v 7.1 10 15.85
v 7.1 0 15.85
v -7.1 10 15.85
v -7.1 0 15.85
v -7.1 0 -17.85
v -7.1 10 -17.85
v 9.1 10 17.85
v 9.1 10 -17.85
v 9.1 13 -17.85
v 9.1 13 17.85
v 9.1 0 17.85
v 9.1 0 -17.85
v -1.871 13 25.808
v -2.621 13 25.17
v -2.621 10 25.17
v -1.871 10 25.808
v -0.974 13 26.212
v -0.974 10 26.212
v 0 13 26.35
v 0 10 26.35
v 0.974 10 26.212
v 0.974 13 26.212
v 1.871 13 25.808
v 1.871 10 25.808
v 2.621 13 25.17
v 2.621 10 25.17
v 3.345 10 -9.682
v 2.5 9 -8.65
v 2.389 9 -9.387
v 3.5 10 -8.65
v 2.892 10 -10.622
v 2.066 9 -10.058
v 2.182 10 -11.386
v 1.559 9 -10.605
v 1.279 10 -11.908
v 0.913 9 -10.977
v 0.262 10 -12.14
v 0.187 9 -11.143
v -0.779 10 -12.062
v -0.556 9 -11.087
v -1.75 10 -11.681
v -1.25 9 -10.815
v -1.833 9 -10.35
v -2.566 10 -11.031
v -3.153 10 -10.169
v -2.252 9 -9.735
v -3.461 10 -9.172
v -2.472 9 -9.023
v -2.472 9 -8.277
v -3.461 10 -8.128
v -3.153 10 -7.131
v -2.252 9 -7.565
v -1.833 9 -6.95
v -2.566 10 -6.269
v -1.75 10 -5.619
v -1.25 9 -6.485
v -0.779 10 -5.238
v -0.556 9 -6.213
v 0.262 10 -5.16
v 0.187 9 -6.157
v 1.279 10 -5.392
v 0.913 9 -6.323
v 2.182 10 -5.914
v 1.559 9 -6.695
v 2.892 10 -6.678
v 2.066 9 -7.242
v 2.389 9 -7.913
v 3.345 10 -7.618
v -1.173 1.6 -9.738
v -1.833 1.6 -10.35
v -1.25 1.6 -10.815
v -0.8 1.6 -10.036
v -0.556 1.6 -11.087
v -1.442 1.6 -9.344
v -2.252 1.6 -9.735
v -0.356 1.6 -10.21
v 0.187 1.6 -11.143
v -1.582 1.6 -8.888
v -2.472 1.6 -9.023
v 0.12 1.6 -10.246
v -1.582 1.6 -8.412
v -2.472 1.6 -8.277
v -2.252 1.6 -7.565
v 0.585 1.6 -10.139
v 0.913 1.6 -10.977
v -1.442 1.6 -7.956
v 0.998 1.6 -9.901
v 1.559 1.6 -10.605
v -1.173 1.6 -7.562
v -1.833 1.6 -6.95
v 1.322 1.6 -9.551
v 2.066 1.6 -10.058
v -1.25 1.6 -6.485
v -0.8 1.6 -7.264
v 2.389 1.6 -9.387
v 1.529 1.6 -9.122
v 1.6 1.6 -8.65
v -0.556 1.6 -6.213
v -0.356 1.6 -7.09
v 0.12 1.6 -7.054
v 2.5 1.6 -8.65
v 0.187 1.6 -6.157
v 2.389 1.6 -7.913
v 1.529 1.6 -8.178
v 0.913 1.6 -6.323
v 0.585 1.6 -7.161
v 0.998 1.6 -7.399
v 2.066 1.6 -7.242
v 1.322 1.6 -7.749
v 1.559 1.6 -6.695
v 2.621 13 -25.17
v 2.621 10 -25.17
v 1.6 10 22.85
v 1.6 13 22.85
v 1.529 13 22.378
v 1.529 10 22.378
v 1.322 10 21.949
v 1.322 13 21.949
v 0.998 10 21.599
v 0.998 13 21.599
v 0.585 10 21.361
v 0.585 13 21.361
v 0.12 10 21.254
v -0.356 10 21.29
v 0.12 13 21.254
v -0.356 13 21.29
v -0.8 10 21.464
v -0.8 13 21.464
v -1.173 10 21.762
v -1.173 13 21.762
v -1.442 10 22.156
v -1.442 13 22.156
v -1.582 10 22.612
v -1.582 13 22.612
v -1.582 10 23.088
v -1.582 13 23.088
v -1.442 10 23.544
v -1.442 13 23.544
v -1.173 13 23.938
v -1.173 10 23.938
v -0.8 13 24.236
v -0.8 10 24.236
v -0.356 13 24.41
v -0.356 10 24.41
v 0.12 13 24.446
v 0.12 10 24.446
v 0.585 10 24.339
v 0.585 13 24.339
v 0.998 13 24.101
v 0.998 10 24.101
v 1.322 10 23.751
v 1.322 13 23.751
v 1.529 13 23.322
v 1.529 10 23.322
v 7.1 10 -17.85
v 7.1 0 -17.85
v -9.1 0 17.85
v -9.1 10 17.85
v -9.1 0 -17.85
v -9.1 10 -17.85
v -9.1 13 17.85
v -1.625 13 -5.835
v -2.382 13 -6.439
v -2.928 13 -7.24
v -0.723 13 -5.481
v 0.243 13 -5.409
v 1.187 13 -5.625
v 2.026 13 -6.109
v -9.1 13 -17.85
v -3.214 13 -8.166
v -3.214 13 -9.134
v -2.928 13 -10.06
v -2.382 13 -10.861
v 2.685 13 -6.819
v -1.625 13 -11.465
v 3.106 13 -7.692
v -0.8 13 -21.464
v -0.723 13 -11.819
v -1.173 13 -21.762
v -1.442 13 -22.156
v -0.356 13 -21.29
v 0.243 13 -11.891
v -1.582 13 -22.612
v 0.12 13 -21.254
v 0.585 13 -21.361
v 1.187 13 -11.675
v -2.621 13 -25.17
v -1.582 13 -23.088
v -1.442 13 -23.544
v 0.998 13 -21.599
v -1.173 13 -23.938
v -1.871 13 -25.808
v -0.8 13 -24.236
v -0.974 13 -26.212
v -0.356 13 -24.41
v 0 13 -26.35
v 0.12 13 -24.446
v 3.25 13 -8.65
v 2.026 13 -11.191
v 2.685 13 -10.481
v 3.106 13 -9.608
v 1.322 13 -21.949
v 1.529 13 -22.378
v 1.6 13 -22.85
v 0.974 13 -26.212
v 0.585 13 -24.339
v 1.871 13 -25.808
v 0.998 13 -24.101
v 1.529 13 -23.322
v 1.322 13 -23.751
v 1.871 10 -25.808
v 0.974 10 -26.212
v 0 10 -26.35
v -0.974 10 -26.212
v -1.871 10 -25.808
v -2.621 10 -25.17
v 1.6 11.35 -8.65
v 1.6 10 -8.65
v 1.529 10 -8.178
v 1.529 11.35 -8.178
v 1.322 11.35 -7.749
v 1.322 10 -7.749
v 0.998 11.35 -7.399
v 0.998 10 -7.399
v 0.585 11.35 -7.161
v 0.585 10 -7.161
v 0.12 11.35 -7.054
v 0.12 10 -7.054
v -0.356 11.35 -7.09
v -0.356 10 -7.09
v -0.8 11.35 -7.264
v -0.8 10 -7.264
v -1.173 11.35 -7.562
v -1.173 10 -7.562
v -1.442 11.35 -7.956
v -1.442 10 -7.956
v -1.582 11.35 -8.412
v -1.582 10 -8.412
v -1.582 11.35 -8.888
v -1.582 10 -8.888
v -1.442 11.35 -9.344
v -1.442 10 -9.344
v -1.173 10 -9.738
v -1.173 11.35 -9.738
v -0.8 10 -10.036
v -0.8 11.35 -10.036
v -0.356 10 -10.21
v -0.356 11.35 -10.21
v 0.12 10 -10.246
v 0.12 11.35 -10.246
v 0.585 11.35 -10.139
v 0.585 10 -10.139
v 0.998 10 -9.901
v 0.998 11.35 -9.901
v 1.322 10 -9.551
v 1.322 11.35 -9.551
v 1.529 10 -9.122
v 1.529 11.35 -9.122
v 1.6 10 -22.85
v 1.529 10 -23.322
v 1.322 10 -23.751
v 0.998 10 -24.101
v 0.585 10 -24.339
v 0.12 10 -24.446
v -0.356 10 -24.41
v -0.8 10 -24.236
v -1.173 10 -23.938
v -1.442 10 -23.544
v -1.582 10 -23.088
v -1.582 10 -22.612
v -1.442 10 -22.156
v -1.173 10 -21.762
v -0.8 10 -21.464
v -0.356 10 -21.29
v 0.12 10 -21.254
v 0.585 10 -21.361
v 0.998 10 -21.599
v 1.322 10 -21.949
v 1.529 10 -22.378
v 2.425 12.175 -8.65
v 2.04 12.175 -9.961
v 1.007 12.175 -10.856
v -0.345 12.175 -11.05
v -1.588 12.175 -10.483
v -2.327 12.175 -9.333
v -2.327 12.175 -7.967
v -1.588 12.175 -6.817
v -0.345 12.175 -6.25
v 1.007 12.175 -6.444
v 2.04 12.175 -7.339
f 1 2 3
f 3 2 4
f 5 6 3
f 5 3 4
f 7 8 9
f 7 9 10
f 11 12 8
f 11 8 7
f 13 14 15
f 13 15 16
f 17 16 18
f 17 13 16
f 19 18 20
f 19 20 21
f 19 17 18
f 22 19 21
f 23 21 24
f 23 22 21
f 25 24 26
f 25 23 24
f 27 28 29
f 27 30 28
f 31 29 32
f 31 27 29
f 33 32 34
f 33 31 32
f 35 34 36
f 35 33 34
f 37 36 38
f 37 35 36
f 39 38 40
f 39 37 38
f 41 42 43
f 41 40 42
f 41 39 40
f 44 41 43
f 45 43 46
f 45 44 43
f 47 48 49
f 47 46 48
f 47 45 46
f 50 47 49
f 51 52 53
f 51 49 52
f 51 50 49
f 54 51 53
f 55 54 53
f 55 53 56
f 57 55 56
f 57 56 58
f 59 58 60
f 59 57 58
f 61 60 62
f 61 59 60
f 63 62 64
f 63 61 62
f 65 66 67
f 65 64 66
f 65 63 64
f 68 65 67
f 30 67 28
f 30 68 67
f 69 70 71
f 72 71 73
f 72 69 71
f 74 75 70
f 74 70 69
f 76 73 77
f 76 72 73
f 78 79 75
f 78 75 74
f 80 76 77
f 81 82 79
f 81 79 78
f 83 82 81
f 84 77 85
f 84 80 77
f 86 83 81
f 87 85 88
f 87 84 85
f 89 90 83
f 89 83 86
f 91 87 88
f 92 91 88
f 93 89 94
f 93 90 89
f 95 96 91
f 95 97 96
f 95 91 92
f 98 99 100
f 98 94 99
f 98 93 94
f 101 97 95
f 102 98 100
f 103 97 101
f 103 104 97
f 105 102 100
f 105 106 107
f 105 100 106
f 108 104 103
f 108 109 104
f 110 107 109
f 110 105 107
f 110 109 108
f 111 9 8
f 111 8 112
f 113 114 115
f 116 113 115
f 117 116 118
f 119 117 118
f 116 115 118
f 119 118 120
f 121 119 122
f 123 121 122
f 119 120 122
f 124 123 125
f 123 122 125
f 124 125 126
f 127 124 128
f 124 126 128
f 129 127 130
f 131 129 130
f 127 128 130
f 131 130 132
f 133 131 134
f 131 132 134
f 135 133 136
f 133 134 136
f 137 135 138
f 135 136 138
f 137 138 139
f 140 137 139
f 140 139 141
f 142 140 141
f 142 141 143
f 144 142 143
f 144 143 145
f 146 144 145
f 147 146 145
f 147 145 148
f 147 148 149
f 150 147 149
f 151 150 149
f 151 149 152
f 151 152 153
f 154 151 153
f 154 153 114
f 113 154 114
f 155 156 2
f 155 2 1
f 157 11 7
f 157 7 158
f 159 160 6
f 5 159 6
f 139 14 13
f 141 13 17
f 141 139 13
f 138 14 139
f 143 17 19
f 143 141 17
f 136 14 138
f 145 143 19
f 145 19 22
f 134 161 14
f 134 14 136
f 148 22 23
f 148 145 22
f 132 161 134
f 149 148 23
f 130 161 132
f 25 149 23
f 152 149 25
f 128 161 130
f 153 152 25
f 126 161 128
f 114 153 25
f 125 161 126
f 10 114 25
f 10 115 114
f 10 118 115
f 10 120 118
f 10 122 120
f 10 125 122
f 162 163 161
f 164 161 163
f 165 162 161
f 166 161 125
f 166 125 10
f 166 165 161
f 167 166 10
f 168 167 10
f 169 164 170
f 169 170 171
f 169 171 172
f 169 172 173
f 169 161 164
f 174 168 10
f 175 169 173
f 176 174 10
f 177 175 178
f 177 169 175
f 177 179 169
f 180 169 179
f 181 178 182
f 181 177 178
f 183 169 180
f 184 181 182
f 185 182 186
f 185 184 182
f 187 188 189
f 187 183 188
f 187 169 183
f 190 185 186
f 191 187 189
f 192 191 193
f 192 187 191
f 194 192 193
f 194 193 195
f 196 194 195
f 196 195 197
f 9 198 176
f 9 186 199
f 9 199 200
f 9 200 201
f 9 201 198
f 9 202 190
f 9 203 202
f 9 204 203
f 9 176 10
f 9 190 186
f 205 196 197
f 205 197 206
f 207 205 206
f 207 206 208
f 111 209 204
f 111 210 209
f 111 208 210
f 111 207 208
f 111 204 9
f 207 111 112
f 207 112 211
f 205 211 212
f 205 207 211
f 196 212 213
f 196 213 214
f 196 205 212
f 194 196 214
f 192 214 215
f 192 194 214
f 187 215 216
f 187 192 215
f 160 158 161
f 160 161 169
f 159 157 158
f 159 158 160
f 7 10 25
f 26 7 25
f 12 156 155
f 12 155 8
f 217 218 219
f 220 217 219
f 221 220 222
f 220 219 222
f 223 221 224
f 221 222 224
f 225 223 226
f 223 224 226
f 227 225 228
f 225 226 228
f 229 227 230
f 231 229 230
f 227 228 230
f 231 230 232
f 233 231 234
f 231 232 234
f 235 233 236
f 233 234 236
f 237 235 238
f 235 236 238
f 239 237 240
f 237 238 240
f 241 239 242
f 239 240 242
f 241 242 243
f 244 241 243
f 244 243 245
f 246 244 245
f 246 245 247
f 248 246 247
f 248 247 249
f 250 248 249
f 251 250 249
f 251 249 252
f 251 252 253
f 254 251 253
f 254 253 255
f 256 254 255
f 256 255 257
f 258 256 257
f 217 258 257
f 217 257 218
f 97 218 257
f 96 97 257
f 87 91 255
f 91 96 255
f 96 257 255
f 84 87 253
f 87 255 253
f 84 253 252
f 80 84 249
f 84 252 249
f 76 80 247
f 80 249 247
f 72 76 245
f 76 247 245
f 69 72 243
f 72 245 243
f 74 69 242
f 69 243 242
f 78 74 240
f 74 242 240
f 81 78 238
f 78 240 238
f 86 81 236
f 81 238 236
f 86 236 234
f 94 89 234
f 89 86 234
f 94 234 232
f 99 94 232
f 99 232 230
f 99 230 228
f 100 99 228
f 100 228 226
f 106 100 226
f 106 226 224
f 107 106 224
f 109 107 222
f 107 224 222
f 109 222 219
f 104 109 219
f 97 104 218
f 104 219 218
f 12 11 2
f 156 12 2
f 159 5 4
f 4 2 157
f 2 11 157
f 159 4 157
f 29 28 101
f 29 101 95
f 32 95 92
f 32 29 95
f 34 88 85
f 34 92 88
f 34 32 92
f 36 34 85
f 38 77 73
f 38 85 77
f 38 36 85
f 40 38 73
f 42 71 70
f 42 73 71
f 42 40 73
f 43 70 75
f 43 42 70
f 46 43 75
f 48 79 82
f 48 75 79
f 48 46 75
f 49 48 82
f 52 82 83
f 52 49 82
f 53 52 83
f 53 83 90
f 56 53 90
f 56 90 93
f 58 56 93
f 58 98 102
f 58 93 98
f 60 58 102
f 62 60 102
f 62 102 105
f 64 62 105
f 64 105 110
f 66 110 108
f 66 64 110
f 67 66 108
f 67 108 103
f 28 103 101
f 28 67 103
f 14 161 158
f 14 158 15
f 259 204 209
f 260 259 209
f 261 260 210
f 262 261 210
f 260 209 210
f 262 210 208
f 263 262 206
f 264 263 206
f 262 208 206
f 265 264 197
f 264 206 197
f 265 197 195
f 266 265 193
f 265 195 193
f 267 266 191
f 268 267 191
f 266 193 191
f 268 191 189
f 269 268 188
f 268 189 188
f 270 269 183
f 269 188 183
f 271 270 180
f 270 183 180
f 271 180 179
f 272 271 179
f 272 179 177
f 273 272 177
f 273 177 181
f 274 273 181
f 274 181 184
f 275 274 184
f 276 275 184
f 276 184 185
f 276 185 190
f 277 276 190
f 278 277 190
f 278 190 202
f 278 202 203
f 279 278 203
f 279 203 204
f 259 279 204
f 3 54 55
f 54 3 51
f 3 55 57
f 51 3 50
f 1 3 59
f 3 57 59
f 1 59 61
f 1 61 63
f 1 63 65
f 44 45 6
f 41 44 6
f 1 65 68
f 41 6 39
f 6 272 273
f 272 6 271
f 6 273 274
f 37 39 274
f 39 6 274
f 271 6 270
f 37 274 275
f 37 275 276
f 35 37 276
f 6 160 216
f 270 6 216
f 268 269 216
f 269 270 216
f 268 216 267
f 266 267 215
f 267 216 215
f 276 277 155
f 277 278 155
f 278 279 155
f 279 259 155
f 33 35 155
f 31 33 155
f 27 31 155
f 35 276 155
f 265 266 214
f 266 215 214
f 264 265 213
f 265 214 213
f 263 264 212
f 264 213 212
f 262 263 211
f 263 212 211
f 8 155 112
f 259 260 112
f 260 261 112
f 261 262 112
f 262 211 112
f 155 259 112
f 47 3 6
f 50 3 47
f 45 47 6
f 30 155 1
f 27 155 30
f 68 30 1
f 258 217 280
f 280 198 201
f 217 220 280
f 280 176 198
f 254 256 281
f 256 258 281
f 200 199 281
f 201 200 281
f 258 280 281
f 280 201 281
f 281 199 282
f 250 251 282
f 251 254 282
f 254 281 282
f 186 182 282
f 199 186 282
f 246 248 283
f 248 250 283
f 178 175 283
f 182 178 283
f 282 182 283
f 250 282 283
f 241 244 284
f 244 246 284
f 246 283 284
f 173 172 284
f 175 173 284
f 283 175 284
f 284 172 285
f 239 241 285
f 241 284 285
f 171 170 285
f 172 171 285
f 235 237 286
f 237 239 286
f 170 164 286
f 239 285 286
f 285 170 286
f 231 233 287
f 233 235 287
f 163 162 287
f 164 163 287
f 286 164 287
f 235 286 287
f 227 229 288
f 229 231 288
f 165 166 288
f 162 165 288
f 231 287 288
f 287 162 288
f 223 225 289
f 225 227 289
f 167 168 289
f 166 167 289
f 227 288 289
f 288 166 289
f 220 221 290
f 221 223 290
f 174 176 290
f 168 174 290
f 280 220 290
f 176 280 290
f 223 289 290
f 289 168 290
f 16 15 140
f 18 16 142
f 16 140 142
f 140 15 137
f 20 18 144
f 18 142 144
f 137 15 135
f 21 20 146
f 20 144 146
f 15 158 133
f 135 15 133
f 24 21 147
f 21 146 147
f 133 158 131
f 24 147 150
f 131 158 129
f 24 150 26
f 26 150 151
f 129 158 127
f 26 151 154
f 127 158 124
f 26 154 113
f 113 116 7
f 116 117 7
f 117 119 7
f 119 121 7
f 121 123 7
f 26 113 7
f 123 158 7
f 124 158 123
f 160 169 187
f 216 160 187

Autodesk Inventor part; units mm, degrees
ref_plane "YZ Plane" through (0, 0, 0) normal (1, 0, 0) x (0, 1, 0)
ref_plane "XZ Plane" through (0, 0, 0) normal (0, 1, 0) x (-1, 0, 0)
ref_plane "XY Plane" through (0, 0, 0) normal (0, 0, 1) x (1, 0, 0)
sketch "Эскиз1" plane through (0, 0, 0) normal (0, 1, 0) x (-1, 0, 0)
  line L0 (7.1, -15.85) -> (-7.1, -15.85)
  line L1 (-7.1, -15.85) -> (-7.1, 15.85)
  line L2 (-7.1, 15.85) -> (7.1, 15.85)
  line L3 (7.1, 15.85) -> (7.1, -15.85)
  line L4 (7.1, -15.85) -> (-7.1, 15.85) construction
  line L5 (-7.1, -15.85) -> (7.1, 15.85) construction
  line L6 (9.1, -17.85) -> (-9.1, -17.85)
  line L7 (-9.1, -17.85) -> (-9.1, 17.85)
  line L8 (-9.1, 17.85) -> (9.1, 17.85)
  line L9 (9.1, 17.85) -> (9.1, -17.85)
  point P0 (0, 0)
  dimension "d0" = 14.2
  dimension "d1" = 31.7
  dimension "d2" = 2
extrude "Выдавливание1" add sketch "Эскиз1" along normal blind 10
sketch "Эскиз2" plane through (0, 10, 0) normal (0, 1, 0) x (1, 0, 0)
  line L0 (-9.1, 17.85) -> (-9.1, -17.85) projected
  line L1 (-9.1, -17.85) -> (9.1, -17.85) projected
  line L2 (9.1, -17.85) -> (9.1, 17.85) projected
  line L3 (9.1, 17.85) -> (-9.1, 17.85) projected
  point P0 (0, 0)
extrude "Выдавливание2" add sketch "Эскиз2" along normal blind 3
sketch "Эскиз4" plane through (9.1, 0, -17.85) normal (0, 0, -1) x (-1, 0, 0)
  line L0 (0, 0) -> (0, 13) construction
  line L1 (0, 0) -> (0, 13) construction
  line L2 (0, 0) -> (18.2, 0) construction
  line L3 (18.2, 0) -> (18.2, 13) construction
  line L4 (18.2, 0) -> (18.2, 13) construction
  line L5 (0, 0) -> (0, 13) projected
  line L6 (0, 0) -> (0, 13)
  line L7 (18.2, 0) -> (0, 0) projected
  line L8 (0, 0) -> (18.2, 0)
  line L9 (18.2, 0) -> (18.2, 13)
  line L10 (5.972, 13) -> (0, 13)
  line L11 (0, 13) -> (18.2, 13)
  line L12 (0, 0) -> (0, 13) projected
  line L13 (0, 13) -> (0, 7)
  line L14 (2, 0) -> (2, 10)
  line L15 (2, 10) -> (16.2, 10)
  line L16 (16.2, 10) -> (16.2, 0)
  point P0 (9.1, 0)
  point P1 (18.2, 7)
  point P2 (0, 6.5)
  point P3 (18.2, 6.5)
  point P4 (16.2, 0)
  dimension "d0" = 14.2
  dimension "d15" = 2
  dimension "d16" = 2
  dimension "d53" = 10
extrude "Выдавливание4" cut sketch "Эскиз4" against normal blind 3 contours L14 L15 L16 L7
sketch "Эскиз5" plane through (0, 13, 0) normal (0, 1, 0) x (1, 0, 0)
  line L0 (0, 0) -> (0, -28.4562) construction
  circle A0 centre (0, -22.85) radius 1.6
  circle A1 centre (0, 22.85) radius 1.6
  line L1 (-9.1, -17.85) -> (9.1, -17.85) projected
  line L2 (9.1, 17.85) -> (-9.1, 17.85) projected
  arc A2 (2.6208, 25.1698) -> (-2.6208, 25.1698) centre (0, 22.85) ccw
  arc A3 (-2.6208, -25.1698) -> (2.6208, -25.1698) centre (0, -22.85) ccw
  line L3 (9.1, 17.85) -> (-9.1, 17.85) projected
  line L4 (9.1, 17.85) -> (2.6208, 25.1698)
  line L5 (-9.1, 17.85) -> (-2.6208, 25.1698)
  line L6 (-9.1, -17.85) -> (-2.6208, -25.1698)
  line L7 (9.1, -17.85) -> (9.1, 17.85) projected
  line L8 (9.1, -17.85) -> (2.6208, -25.1698)
  point P0 (7.1, 17.85)
  dimension "d32" = 3.2
  dimension "d33" = 3.2
  dimension "d34" = 5
  dimension "d35" = 5
  dimension "d36" = 7
  dimension "d37" = 7
extrude "Выдавливание5" add sketch "Эскиз5" against normal blind 3
sketch "Эскиз6" plane through (0, 10, 0) normal (0, -1, 0) x (1, 0, 0)
  circle A0 centre (0, -8.65) radius 1.5 construction
  circle A1 centre (0, -8.65) radius 1.6
  point P0 (0, 0)
  dimension "d38" = 3.2
extrude "Выдавливание6" cut sketch "Эскиз6" against normal blind 10
chamfer "Фаска1" distance 1.65 angle 45 1 edges at (-1.6, 13, -8.65)
sketch "Эскиз7" plane through (0, 10, 0) normal (0, -1, 0) x (1, 0, 0)
  circle A0 centre (0, -8.65) radius 1.6 projected
  circle A1 centre (0, -8.65) radius 1.6
  circle A2 centre (0, -8.65) radius 2.5
  point P0 (0, 0)
  dimension "d44" = 5
extrude "Выдавливание7" add sketch "Эскиз7" along normal blind 8.4
chamfer "Фаска3" distance 1 angle 45 1 edges at (-2.5, 10, -8.65)
properties part number "креп_опт" material "Полипропилен"
